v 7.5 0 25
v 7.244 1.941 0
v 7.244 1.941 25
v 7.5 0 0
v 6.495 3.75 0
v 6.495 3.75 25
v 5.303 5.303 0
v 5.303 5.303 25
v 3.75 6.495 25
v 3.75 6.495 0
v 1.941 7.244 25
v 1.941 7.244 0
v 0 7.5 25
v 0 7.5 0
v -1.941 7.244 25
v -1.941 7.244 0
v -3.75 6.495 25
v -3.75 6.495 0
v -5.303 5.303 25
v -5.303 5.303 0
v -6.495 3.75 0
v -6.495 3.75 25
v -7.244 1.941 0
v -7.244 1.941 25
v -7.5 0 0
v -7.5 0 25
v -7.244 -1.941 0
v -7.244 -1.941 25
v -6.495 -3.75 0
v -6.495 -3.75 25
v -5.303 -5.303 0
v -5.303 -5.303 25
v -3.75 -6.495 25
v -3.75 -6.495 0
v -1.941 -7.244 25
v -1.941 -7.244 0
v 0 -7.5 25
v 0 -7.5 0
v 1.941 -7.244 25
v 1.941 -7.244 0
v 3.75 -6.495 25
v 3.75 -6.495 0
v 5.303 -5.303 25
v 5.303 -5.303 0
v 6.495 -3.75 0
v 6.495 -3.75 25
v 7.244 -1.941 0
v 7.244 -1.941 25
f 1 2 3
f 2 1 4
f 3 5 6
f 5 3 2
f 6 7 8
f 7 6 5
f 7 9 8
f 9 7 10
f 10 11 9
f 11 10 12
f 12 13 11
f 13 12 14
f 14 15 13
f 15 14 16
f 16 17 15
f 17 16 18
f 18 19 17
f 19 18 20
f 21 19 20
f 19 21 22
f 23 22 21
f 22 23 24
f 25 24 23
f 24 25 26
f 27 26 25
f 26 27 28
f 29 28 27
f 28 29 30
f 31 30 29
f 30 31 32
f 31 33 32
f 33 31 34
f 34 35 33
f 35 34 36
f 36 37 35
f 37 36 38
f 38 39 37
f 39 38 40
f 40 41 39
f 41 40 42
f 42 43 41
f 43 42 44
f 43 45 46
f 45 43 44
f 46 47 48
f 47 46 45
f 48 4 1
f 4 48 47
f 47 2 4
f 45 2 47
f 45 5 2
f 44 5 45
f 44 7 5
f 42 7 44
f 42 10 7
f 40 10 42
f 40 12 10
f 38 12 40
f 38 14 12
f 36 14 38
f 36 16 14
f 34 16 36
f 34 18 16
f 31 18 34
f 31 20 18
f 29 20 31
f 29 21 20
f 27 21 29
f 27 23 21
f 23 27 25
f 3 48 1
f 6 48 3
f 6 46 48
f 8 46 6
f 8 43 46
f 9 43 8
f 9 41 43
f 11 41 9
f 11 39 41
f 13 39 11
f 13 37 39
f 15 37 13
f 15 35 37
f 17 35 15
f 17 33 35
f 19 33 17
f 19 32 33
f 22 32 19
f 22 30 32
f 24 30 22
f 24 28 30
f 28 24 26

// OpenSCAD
module laser(length=19) {
  cylinder(r=15/2,h=length);
}
laser(25); 
